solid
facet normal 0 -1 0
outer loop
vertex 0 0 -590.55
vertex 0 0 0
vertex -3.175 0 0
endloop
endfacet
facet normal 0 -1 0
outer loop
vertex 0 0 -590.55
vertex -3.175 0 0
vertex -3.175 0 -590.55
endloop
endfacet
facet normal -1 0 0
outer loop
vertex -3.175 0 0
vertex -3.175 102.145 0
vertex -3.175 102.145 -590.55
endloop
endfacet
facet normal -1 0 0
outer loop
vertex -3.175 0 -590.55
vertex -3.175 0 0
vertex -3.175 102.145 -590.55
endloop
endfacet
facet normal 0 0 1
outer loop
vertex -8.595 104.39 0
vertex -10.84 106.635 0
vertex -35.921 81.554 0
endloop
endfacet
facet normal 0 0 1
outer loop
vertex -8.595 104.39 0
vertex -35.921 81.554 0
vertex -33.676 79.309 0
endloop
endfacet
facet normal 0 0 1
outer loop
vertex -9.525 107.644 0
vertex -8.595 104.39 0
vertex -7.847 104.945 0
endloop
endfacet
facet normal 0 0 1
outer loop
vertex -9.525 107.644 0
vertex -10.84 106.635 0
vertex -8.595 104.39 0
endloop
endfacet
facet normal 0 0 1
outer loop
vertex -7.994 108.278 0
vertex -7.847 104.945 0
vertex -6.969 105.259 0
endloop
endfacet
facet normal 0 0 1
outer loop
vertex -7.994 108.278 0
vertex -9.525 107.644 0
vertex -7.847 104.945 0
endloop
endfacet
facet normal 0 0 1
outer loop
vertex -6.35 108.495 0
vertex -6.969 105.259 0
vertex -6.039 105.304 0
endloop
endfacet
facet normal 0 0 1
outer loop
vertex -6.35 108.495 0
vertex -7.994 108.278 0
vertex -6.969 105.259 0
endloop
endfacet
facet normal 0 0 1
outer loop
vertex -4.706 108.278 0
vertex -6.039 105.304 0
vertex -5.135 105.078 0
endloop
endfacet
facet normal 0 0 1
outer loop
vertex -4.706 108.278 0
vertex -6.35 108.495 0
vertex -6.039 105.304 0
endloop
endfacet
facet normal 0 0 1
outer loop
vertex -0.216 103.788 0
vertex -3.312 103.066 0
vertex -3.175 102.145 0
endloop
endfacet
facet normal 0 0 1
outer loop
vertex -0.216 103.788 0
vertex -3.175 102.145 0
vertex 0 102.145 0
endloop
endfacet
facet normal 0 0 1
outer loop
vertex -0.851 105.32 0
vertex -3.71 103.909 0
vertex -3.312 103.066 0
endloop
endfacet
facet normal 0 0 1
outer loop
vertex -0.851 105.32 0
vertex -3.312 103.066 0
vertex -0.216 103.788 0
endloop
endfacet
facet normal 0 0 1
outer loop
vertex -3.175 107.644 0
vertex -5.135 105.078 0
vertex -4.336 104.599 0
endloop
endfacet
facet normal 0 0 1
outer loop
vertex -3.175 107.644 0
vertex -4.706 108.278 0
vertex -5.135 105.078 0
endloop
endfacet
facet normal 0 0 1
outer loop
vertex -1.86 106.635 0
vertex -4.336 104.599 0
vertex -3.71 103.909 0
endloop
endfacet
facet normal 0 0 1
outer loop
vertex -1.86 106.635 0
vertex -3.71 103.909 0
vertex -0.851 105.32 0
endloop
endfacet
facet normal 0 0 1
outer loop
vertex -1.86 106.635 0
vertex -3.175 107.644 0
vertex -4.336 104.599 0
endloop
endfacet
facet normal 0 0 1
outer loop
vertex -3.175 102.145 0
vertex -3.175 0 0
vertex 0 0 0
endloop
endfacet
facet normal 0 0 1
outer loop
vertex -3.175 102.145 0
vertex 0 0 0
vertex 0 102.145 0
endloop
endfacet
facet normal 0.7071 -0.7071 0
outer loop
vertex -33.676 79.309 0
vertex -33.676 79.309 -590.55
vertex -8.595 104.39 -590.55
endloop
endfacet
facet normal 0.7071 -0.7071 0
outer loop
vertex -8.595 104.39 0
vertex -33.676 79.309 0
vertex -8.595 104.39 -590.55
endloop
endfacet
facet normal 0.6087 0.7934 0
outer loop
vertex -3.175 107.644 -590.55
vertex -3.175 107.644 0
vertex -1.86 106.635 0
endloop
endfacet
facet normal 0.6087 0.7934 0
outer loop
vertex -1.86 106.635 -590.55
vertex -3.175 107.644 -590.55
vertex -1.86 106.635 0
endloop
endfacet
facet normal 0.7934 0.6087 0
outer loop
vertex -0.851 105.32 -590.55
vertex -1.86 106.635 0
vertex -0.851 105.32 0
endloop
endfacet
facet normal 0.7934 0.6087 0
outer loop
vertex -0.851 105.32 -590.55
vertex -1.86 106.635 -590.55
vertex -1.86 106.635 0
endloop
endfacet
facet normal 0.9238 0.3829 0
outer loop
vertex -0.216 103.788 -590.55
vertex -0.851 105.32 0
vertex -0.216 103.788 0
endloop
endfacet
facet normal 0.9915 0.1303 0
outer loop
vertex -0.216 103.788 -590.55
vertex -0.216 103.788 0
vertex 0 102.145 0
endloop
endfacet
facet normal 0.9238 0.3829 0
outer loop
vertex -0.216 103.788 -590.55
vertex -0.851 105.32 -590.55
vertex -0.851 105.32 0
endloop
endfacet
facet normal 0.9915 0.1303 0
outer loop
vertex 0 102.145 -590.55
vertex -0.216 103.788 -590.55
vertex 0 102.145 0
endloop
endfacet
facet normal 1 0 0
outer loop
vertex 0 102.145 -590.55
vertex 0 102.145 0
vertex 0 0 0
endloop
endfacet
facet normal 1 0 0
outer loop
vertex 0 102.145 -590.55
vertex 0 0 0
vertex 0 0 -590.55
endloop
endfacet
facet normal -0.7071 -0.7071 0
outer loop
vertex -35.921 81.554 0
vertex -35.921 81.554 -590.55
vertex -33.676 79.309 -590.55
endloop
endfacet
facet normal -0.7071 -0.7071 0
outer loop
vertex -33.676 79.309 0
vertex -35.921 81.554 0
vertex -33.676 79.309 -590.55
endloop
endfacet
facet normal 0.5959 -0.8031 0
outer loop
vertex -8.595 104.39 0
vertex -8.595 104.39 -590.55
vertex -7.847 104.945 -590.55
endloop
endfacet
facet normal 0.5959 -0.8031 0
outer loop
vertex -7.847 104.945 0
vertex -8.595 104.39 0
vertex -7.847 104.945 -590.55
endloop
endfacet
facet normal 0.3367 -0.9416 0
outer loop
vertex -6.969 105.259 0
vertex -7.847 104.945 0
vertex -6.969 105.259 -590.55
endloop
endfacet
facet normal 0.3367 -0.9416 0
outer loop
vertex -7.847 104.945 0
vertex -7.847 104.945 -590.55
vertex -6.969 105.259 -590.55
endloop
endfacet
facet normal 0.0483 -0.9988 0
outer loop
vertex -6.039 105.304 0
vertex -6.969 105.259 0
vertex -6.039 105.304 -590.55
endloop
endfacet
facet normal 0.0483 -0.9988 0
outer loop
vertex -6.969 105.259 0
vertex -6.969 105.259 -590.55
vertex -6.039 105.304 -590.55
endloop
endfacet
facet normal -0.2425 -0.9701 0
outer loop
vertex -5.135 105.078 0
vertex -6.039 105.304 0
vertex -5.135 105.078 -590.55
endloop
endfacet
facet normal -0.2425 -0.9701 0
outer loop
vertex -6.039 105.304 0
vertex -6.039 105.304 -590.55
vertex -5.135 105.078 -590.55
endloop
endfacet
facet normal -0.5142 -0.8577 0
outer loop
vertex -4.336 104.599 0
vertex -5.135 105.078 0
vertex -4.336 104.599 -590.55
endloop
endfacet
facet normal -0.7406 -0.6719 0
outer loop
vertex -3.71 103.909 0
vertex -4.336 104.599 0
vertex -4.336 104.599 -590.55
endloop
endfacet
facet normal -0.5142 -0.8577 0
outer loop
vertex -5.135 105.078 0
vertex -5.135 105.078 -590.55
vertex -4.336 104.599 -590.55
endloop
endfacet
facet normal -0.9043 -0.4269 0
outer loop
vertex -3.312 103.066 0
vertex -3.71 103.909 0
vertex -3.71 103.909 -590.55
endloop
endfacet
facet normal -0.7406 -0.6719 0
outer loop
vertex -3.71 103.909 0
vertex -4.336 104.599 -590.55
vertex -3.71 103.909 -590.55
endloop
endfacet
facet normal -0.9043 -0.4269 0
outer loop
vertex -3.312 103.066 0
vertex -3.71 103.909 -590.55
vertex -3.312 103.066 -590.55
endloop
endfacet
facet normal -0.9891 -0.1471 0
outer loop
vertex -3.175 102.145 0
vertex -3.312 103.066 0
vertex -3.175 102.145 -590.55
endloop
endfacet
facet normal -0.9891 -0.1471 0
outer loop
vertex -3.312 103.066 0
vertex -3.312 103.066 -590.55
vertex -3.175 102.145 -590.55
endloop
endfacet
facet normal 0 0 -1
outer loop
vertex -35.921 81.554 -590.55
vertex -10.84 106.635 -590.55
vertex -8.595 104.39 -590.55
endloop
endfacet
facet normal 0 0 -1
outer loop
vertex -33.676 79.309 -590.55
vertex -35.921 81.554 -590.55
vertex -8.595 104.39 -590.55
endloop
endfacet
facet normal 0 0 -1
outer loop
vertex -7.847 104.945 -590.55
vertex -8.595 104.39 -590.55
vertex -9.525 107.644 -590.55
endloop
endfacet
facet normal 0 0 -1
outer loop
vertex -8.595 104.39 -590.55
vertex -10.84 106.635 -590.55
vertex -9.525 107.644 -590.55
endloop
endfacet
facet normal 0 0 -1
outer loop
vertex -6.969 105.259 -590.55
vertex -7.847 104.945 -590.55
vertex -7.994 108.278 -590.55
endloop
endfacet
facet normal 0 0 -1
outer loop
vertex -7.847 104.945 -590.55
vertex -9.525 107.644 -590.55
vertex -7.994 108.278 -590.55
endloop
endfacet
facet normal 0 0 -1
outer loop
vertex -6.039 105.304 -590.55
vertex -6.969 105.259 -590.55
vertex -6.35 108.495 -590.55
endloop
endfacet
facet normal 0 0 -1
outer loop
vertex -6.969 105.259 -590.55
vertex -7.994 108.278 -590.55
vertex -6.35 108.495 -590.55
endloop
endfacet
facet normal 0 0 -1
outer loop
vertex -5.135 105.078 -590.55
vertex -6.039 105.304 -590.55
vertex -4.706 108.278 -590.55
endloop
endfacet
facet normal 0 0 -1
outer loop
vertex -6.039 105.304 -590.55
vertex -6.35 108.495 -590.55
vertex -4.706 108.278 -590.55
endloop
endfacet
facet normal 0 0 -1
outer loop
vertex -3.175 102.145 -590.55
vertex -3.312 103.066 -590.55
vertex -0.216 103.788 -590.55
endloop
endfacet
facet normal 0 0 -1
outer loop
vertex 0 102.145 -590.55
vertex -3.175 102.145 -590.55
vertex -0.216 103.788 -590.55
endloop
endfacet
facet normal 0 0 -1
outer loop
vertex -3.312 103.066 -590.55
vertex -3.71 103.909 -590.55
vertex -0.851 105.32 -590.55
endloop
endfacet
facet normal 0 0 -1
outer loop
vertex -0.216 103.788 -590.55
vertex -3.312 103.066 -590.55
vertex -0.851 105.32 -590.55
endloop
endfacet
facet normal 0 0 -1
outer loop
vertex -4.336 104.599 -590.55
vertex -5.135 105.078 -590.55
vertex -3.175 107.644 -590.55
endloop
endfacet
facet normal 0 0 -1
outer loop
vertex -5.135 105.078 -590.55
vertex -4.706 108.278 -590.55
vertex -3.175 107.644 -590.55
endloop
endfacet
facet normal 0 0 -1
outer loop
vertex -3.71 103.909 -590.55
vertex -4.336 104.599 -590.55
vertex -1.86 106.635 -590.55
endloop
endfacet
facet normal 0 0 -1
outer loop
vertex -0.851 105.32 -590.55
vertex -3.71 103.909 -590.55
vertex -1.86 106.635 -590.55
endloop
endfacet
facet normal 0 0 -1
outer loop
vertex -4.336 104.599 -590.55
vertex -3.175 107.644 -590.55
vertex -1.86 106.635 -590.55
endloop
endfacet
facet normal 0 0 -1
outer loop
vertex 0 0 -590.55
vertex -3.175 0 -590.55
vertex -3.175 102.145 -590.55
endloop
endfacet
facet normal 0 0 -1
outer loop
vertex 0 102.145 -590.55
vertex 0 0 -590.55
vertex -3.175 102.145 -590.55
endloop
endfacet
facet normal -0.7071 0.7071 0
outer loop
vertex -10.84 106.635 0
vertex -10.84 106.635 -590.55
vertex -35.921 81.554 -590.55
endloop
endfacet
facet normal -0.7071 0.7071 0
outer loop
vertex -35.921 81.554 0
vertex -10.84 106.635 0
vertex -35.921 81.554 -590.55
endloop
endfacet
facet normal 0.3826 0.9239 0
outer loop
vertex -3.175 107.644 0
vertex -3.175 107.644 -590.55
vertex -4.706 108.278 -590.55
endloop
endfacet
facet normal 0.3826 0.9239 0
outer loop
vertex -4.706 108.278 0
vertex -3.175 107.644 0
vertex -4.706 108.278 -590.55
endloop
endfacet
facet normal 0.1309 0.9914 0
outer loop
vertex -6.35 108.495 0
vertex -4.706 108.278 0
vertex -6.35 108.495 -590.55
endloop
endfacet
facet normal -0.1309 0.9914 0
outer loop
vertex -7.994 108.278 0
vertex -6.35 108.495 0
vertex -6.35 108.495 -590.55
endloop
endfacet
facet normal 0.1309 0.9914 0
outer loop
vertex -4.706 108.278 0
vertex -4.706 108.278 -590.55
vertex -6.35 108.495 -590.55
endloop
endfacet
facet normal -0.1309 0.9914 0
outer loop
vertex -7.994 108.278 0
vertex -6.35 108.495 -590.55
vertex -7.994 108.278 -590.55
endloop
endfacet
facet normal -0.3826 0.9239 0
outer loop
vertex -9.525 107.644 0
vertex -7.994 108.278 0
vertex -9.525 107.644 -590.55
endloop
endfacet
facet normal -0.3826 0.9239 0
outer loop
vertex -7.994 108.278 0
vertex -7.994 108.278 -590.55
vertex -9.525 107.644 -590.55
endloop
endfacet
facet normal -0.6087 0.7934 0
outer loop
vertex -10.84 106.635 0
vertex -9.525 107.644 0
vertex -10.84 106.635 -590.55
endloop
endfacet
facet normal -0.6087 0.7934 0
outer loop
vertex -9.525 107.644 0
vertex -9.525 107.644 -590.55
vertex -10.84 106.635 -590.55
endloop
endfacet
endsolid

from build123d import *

# Parameters (mm, degrees)
SKETCH1_W            = 590.55
SKETCH1_H            = 114.3
BASE_FLANGE1_DEPTH   = 3.175
EDGE_FLANGE1_START   = -590.55
EDGE_FLANGE1_DEPTH   = 590.55
EDGE_FLANGE1_2_DEPTH = 590.55


# Read off the part's stored shape, not the designer's step: Edge-Flange1
# Sheet-metal steps are written as plain solids
with BuildPart() as part:
    # Sketch1 → Base-Flange1 (new body)
    with BuildSketch(Plane(origin=(0, 0, 0), x_dir=(0, 0, -1), z_dir=(1, 0, 0))):
        with Locations((295.275, 57.15)):
            Rectangle(SKETCH1_W, SKETCH1_H)
    extrude(amount=-BASE_FLANGE1_DEPTH)

    # Edge-Flange1 outline → Edge-Flange1 (cut)
    with BuildSketch(Plane.XY.offset(EDGE_FLANGE1_START)):
        with BuildLine():
            Line((-3.175, 114.3), (-3.175, 107.644005193))
            ThreePointArc((-3.175, 107.644005193), (-0.850738686, 105.319743879), (0, 102.144743879))
            Line((0, 102.144743879), (0, 114.3))
            Line((0, 114.3), (-3.175, 114.3))
        make_face()
    extrude(amount=EDGE_FLANGE1_DEPTH, mode=Mode.SUBTRACT)

    # Edge-Flange1 2 outline → Edge-Flange1 2 (add)
    with BuildSketch(Plane.XY.offset(EDGE_FLANGE1_START)):
        with BuildLine():
            ThreePointArc((-3.175, 107.644005193), (-7.178841321, 108.440418748), (-10.840128061, 106.634871939))
            Line((-10.840128061, 106.634871939), (-35.921024484, 81.553975516))
            Line((-35.921024484, 81.553975516), (-33.675960454, 79.308911485))
            Line((-33.675960454, 79.308911485), (-8.59506403, 104.389807909))
            ThreePointArc((-8.59506403, 104.389807909), (-5.134980102, 105.078061395), (-3.175, 102.144743879))
            Line((-3.175, 102.144743879), (-3.175, 107.644005193))
        make_face()
    extrude(amount=EDGE_FLANGE1_2_DEPTH)


solid = part.part
